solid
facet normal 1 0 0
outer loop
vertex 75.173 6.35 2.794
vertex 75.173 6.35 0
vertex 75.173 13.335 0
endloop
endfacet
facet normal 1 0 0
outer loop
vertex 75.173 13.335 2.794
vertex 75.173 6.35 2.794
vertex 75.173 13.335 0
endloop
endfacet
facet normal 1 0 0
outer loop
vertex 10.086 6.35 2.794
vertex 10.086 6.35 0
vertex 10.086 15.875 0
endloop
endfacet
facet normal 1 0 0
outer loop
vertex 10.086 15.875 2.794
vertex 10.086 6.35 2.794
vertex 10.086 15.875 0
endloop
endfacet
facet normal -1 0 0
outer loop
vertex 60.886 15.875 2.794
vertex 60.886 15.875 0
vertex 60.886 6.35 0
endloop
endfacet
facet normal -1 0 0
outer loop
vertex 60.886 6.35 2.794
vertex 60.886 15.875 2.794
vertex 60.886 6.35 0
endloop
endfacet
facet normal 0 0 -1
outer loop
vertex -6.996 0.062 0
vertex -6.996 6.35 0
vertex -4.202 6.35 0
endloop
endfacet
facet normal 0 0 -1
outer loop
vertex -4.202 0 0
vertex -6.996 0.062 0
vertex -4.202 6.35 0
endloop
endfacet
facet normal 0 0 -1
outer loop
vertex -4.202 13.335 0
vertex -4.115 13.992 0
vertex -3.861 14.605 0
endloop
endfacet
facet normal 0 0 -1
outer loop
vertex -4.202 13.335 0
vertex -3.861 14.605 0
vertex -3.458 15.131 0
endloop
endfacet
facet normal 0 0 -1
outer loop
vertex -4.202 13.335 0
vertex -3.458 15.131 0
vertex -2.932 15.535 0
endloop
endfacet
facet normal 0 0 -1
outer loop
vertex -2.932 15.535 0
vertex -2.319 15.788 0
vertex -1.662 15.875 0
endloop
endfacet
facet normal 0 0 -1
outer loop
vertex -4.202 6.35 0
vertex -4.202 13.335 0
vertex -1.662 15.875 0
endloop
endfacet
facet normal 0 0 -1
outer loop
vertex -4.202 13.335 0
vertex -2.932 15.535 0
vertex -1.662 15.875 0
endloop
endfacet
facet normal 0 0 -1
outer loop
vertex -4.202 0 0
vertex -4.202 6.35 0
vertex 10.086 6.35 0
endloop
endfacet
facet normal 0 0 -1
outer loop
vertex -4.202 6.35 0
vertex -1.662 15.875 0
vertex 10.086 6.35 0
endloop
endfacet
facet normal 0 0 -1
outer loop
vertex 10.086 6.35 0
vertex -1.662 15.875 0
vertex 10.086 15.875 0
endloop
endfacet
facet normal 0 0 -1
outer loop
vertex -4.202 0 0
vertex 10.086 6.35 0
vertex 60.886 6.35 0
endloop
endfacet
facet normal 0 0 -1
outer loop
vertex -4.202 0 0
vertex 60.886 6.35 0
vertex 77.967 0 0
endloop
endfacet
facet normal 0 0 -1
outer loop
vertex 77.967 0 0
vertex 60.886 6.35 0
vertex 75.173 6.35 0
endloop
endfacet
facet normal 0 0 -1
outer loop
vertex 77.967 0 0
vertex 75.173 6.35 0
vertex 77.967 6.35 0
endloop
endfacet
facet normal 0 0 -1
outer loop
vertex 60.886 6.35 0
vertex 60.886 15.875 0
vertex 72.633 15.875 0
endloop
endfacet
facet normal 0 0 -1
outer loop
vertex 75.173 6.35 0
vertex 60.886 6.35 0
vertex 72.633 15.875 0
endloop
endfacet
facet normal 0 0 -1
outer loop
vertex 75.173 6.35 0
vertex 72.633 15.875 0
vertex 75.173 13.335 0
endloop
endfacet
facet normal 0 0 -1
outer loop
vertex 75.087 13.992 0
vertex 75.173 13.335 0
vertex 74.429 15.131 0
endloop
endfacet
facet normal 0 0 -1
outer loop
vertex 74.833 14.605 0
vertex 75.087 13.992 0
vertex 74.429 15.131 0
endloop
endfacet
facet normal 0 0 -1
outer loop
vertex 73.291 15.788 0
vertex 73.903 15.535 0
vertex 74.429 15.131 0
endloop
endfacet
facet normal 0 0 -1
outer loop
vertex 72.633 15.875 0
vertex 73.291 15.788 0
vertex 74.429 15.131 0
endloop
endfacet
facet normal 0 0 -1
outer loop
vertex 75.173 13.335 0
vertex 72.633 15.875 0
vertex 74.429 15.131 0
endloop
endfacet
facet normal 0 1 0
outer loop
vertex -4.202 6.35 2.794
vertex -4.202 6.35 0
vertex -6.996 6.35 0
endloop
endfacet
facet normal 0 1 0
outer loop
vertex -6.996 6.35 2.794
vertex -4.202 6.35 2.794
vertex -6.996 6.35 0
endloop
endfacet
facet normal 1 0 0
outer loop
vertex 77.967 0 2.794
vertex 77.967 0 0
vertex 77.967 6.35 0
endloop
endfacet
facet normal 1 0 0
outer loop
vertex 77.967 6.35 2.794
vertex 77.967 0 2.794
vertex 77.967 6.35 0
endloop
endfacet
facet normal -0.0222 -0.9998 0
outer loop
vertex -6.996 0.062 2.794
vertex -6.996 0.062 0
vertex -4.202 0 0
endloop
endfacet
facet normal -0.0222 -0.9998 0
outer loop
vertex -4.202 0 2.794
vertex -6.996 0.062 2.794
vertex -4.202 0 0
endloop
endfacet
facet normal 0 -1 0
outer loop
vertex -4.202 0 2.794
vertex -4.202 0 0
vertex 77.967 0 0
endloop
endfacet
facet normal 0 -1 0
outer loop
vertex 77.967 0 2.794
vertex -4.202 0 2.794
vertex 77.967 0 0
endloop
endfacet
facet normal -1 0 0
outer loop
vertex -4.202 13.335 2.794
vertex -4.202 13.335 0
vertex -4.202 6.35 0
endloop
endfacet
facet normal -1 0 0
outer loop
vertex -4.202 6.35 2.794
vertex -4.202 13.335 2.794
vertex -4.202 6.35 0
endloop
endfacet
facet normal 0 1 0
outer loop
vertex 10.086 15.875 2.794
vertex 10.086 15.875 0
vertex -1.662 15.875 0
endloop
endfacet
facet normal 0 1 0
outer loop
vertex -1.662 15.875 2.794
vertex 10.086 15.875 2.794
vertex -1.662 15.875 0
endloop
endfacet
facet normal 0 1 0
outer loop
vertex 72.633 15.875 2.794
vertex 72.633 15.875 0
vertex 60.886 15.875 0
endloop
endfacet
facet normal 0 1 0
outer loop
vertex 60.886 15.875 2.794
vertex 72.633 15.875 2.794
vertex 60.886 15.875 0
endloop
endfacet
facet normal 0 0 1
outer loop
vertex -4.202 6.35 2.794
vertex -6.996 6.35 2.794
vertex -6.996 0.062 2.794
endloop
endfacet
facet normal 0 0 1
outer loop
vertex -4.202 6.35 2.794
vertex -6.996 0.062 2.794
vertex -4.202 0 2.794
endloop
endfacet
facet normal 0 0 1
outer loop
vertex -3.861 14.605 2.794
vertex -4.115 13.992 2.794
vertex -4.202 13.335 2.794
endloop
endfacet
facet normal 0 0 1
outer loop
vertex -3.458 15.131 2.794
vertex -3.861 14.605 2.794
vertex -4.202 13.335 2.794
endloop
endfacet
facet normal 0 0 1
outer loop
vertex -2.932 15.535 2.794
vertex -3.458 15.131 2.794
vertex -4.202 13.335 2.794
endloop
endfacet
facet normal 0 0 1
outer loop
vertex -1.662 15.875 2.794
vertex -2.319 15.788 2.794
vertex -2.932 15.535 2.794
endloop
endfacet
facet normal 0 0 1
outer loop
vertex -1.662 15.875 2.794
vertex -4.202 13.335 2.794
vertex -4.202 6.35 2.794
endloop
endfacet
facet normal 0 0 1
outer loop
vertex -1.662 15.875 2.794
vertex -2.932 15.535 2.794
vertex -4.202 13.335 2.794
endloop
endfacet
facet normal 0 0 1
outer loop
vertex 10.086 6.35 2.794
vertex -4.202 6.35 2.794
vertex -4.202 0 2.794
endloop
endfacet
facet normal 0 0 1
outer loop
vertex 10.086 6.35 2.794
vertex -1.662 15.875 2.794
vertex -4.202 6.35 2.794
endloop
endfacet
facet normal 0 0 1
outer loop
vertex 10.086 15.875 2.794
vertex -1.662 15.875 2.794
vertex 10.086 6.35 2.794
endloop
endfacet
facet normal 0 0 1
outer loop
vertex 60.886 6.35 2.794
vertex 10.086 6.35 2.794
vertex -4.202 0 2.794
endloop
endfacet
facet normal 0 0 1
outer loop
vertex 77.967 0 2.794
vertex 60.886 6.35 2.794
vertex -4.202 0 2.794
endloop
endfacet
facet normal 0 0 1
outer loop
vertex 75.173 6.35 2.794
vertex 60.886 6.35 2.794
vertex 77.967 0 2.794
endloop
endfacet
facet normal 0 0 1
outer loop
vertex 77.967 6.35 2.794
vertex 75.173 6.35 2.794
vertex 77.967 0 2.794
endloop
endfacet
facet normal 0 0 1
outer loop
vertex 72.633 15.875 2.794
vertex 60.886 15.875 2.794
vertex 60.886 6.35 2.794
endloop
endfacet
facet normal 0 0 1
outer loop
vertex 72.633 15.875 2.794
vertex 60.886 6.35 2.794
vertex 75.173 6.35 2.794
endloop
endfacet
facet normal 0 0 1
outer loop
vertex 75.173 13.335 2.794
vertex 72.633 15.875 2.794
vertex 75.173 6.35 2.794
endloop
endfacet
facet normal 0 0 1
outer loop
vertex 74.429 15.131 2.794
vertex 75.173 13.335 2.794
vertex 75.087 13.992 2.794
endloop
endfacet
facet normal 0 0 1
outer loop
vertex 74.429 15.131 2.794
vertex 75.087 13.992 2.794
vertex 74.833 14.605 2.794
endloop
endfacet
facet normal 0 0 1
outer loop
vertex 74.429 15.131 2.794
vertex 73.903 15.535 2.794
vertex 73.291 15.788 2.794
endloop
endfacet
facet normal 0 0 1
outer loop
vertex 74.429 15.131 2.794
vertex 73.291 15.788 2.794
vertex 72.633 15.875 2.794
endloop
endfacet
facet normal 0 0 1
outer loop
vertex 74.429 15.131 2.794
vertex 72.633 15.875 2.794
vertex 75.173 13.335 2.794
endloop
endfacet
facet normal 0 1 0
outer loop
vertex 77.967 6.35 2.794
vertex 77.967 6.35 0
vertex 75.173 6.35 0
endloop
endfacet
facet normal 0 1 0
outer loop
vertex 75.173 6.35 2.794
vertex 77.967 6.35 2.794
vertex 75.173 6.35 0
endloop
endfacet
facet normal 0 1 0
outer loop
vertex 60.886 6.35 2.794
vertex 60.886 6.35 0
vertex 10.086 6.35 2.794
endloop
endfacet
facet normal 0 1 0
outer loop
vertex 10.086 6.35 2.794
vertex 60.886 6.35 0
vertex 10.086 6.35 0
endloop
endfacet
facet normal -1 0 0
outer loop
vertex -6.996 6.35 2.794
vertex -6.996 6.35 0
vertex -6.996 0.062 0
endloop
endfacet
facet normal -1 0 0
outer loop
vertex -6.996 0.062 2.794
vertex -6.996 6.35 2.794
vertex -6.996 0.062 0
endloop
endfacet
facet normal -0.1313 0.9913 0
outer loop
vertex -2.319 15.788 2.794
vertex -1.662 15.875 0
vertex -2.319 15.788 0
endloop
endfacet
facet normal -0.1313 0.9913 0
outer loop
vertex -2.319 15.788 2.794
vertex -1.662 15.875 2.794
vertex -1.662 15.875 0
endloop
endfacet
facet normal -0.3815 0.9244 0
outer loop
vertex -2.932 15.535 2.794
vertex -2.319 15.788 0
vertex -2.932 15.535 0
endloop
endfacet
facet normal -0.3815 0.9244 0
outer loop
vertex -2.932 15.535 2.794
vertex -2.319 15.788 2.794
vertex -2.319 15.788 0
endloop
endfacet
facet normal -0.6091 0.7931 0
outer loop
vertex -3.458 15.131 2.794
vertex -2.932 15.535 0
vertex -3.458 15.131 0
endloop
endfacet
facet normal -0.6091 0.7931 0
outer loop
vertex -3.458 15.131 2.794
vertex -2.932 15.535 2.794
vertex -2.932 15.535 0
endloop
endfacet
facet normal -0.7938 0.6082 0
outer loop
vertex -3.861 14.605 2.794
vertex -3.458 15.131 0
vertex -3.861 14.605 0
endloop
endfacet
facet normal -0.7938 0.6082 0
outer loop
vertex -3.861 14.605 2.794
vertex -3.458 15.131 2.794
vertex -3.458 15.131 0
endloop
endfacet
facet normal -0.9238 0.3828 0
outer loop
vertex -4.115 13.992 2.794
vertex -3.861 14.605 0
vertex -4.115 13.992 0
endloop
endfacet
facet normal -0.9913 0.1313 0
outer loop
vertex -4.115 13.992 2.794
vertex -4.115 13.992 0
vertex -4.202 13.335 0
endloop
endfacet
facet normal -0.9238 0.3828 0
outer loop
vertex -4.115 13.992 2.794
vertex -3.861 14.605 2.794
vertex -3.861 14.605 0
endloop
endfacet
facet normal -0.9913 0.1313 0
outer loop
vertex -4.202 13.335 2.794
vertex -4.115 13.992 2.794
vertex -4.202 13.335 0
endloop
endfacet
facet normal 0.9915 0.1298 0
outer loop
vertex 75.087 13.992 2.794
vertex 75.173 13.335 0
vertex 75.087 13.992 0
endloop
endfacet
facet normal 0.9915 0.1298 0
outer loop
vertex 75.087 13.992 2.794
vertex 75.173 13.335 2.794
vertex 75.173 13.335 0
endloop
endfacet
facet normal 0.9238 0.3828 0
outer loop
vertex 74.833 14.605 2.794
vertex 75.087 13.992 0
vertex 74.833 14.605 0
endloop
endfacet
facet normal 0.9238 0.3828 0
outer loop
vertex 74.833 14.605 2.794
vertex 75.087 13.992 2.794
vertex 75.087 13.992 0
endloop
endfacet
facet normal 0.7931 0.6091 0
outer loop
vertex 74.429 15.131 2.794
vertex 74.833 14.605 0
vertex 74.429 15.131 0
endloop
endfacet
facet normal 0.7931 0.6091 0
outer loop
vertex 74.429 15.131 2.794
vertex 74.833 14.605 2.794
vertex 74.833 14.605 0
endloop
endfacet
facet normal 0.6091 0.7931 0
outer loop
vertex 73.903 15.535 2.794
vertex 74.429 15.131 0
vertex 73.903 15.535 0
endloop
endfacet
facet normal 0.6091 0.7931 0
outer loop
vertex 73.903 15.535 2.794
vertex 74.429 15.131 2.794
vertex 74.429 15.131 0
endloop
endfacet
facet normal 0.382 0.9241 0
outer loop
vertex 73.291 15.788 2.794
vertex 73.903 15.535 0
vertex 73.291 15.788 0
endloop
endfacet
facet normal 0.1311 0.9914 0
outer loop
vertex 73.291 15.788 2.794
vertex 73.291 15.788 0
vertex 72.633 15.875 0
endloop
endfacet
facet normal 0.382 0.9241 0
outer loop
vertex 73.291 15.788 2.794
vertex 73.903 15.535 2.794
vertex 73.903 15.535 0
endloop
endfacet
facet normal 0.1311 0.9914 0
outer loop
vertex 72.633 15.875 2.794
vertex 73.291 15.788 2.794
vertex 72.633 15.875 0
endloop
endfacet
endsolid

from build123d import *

# Parameters (mm, degrees)
BOSS_EXTRUDE1_DEPTH = 2.794
FILLET1_R           = 2.54


with BuildPart() as part:
    # Sketch1 → Boss-Extrude1 (new body)
    with BuildSketch(Plane.XY):
        Polygon((-4.201711417, 0), (75.173288583, 0), (77.967288583, 0), (77.967288583, 6.35), (75.173288583, 6.35), (75.173288583, 15.875), (60.885788583, 15.875), (60.885788583, 6.35), (10.085788583, 6.35), (10.085788583, 15.875), (-4.201711417, 15.875), (-4.201711417, 6.35), (-6.995711417, 6.35), (-6.995711417, 0.062112437), align=None)
    extrude(amount=BOSS_EXTRUDE1_DEPTH)

    # Fillet1
    fillet1_edges = [part.edges().sort_by_distance(p)[0] for p in [
        (-4.201711417, 15.875, 1.397),
        (75.173288583, 15.875, 1.397),
    ]]
    fillet(fillet1_edges, radius=FILLET1_R)


solid = part.part
